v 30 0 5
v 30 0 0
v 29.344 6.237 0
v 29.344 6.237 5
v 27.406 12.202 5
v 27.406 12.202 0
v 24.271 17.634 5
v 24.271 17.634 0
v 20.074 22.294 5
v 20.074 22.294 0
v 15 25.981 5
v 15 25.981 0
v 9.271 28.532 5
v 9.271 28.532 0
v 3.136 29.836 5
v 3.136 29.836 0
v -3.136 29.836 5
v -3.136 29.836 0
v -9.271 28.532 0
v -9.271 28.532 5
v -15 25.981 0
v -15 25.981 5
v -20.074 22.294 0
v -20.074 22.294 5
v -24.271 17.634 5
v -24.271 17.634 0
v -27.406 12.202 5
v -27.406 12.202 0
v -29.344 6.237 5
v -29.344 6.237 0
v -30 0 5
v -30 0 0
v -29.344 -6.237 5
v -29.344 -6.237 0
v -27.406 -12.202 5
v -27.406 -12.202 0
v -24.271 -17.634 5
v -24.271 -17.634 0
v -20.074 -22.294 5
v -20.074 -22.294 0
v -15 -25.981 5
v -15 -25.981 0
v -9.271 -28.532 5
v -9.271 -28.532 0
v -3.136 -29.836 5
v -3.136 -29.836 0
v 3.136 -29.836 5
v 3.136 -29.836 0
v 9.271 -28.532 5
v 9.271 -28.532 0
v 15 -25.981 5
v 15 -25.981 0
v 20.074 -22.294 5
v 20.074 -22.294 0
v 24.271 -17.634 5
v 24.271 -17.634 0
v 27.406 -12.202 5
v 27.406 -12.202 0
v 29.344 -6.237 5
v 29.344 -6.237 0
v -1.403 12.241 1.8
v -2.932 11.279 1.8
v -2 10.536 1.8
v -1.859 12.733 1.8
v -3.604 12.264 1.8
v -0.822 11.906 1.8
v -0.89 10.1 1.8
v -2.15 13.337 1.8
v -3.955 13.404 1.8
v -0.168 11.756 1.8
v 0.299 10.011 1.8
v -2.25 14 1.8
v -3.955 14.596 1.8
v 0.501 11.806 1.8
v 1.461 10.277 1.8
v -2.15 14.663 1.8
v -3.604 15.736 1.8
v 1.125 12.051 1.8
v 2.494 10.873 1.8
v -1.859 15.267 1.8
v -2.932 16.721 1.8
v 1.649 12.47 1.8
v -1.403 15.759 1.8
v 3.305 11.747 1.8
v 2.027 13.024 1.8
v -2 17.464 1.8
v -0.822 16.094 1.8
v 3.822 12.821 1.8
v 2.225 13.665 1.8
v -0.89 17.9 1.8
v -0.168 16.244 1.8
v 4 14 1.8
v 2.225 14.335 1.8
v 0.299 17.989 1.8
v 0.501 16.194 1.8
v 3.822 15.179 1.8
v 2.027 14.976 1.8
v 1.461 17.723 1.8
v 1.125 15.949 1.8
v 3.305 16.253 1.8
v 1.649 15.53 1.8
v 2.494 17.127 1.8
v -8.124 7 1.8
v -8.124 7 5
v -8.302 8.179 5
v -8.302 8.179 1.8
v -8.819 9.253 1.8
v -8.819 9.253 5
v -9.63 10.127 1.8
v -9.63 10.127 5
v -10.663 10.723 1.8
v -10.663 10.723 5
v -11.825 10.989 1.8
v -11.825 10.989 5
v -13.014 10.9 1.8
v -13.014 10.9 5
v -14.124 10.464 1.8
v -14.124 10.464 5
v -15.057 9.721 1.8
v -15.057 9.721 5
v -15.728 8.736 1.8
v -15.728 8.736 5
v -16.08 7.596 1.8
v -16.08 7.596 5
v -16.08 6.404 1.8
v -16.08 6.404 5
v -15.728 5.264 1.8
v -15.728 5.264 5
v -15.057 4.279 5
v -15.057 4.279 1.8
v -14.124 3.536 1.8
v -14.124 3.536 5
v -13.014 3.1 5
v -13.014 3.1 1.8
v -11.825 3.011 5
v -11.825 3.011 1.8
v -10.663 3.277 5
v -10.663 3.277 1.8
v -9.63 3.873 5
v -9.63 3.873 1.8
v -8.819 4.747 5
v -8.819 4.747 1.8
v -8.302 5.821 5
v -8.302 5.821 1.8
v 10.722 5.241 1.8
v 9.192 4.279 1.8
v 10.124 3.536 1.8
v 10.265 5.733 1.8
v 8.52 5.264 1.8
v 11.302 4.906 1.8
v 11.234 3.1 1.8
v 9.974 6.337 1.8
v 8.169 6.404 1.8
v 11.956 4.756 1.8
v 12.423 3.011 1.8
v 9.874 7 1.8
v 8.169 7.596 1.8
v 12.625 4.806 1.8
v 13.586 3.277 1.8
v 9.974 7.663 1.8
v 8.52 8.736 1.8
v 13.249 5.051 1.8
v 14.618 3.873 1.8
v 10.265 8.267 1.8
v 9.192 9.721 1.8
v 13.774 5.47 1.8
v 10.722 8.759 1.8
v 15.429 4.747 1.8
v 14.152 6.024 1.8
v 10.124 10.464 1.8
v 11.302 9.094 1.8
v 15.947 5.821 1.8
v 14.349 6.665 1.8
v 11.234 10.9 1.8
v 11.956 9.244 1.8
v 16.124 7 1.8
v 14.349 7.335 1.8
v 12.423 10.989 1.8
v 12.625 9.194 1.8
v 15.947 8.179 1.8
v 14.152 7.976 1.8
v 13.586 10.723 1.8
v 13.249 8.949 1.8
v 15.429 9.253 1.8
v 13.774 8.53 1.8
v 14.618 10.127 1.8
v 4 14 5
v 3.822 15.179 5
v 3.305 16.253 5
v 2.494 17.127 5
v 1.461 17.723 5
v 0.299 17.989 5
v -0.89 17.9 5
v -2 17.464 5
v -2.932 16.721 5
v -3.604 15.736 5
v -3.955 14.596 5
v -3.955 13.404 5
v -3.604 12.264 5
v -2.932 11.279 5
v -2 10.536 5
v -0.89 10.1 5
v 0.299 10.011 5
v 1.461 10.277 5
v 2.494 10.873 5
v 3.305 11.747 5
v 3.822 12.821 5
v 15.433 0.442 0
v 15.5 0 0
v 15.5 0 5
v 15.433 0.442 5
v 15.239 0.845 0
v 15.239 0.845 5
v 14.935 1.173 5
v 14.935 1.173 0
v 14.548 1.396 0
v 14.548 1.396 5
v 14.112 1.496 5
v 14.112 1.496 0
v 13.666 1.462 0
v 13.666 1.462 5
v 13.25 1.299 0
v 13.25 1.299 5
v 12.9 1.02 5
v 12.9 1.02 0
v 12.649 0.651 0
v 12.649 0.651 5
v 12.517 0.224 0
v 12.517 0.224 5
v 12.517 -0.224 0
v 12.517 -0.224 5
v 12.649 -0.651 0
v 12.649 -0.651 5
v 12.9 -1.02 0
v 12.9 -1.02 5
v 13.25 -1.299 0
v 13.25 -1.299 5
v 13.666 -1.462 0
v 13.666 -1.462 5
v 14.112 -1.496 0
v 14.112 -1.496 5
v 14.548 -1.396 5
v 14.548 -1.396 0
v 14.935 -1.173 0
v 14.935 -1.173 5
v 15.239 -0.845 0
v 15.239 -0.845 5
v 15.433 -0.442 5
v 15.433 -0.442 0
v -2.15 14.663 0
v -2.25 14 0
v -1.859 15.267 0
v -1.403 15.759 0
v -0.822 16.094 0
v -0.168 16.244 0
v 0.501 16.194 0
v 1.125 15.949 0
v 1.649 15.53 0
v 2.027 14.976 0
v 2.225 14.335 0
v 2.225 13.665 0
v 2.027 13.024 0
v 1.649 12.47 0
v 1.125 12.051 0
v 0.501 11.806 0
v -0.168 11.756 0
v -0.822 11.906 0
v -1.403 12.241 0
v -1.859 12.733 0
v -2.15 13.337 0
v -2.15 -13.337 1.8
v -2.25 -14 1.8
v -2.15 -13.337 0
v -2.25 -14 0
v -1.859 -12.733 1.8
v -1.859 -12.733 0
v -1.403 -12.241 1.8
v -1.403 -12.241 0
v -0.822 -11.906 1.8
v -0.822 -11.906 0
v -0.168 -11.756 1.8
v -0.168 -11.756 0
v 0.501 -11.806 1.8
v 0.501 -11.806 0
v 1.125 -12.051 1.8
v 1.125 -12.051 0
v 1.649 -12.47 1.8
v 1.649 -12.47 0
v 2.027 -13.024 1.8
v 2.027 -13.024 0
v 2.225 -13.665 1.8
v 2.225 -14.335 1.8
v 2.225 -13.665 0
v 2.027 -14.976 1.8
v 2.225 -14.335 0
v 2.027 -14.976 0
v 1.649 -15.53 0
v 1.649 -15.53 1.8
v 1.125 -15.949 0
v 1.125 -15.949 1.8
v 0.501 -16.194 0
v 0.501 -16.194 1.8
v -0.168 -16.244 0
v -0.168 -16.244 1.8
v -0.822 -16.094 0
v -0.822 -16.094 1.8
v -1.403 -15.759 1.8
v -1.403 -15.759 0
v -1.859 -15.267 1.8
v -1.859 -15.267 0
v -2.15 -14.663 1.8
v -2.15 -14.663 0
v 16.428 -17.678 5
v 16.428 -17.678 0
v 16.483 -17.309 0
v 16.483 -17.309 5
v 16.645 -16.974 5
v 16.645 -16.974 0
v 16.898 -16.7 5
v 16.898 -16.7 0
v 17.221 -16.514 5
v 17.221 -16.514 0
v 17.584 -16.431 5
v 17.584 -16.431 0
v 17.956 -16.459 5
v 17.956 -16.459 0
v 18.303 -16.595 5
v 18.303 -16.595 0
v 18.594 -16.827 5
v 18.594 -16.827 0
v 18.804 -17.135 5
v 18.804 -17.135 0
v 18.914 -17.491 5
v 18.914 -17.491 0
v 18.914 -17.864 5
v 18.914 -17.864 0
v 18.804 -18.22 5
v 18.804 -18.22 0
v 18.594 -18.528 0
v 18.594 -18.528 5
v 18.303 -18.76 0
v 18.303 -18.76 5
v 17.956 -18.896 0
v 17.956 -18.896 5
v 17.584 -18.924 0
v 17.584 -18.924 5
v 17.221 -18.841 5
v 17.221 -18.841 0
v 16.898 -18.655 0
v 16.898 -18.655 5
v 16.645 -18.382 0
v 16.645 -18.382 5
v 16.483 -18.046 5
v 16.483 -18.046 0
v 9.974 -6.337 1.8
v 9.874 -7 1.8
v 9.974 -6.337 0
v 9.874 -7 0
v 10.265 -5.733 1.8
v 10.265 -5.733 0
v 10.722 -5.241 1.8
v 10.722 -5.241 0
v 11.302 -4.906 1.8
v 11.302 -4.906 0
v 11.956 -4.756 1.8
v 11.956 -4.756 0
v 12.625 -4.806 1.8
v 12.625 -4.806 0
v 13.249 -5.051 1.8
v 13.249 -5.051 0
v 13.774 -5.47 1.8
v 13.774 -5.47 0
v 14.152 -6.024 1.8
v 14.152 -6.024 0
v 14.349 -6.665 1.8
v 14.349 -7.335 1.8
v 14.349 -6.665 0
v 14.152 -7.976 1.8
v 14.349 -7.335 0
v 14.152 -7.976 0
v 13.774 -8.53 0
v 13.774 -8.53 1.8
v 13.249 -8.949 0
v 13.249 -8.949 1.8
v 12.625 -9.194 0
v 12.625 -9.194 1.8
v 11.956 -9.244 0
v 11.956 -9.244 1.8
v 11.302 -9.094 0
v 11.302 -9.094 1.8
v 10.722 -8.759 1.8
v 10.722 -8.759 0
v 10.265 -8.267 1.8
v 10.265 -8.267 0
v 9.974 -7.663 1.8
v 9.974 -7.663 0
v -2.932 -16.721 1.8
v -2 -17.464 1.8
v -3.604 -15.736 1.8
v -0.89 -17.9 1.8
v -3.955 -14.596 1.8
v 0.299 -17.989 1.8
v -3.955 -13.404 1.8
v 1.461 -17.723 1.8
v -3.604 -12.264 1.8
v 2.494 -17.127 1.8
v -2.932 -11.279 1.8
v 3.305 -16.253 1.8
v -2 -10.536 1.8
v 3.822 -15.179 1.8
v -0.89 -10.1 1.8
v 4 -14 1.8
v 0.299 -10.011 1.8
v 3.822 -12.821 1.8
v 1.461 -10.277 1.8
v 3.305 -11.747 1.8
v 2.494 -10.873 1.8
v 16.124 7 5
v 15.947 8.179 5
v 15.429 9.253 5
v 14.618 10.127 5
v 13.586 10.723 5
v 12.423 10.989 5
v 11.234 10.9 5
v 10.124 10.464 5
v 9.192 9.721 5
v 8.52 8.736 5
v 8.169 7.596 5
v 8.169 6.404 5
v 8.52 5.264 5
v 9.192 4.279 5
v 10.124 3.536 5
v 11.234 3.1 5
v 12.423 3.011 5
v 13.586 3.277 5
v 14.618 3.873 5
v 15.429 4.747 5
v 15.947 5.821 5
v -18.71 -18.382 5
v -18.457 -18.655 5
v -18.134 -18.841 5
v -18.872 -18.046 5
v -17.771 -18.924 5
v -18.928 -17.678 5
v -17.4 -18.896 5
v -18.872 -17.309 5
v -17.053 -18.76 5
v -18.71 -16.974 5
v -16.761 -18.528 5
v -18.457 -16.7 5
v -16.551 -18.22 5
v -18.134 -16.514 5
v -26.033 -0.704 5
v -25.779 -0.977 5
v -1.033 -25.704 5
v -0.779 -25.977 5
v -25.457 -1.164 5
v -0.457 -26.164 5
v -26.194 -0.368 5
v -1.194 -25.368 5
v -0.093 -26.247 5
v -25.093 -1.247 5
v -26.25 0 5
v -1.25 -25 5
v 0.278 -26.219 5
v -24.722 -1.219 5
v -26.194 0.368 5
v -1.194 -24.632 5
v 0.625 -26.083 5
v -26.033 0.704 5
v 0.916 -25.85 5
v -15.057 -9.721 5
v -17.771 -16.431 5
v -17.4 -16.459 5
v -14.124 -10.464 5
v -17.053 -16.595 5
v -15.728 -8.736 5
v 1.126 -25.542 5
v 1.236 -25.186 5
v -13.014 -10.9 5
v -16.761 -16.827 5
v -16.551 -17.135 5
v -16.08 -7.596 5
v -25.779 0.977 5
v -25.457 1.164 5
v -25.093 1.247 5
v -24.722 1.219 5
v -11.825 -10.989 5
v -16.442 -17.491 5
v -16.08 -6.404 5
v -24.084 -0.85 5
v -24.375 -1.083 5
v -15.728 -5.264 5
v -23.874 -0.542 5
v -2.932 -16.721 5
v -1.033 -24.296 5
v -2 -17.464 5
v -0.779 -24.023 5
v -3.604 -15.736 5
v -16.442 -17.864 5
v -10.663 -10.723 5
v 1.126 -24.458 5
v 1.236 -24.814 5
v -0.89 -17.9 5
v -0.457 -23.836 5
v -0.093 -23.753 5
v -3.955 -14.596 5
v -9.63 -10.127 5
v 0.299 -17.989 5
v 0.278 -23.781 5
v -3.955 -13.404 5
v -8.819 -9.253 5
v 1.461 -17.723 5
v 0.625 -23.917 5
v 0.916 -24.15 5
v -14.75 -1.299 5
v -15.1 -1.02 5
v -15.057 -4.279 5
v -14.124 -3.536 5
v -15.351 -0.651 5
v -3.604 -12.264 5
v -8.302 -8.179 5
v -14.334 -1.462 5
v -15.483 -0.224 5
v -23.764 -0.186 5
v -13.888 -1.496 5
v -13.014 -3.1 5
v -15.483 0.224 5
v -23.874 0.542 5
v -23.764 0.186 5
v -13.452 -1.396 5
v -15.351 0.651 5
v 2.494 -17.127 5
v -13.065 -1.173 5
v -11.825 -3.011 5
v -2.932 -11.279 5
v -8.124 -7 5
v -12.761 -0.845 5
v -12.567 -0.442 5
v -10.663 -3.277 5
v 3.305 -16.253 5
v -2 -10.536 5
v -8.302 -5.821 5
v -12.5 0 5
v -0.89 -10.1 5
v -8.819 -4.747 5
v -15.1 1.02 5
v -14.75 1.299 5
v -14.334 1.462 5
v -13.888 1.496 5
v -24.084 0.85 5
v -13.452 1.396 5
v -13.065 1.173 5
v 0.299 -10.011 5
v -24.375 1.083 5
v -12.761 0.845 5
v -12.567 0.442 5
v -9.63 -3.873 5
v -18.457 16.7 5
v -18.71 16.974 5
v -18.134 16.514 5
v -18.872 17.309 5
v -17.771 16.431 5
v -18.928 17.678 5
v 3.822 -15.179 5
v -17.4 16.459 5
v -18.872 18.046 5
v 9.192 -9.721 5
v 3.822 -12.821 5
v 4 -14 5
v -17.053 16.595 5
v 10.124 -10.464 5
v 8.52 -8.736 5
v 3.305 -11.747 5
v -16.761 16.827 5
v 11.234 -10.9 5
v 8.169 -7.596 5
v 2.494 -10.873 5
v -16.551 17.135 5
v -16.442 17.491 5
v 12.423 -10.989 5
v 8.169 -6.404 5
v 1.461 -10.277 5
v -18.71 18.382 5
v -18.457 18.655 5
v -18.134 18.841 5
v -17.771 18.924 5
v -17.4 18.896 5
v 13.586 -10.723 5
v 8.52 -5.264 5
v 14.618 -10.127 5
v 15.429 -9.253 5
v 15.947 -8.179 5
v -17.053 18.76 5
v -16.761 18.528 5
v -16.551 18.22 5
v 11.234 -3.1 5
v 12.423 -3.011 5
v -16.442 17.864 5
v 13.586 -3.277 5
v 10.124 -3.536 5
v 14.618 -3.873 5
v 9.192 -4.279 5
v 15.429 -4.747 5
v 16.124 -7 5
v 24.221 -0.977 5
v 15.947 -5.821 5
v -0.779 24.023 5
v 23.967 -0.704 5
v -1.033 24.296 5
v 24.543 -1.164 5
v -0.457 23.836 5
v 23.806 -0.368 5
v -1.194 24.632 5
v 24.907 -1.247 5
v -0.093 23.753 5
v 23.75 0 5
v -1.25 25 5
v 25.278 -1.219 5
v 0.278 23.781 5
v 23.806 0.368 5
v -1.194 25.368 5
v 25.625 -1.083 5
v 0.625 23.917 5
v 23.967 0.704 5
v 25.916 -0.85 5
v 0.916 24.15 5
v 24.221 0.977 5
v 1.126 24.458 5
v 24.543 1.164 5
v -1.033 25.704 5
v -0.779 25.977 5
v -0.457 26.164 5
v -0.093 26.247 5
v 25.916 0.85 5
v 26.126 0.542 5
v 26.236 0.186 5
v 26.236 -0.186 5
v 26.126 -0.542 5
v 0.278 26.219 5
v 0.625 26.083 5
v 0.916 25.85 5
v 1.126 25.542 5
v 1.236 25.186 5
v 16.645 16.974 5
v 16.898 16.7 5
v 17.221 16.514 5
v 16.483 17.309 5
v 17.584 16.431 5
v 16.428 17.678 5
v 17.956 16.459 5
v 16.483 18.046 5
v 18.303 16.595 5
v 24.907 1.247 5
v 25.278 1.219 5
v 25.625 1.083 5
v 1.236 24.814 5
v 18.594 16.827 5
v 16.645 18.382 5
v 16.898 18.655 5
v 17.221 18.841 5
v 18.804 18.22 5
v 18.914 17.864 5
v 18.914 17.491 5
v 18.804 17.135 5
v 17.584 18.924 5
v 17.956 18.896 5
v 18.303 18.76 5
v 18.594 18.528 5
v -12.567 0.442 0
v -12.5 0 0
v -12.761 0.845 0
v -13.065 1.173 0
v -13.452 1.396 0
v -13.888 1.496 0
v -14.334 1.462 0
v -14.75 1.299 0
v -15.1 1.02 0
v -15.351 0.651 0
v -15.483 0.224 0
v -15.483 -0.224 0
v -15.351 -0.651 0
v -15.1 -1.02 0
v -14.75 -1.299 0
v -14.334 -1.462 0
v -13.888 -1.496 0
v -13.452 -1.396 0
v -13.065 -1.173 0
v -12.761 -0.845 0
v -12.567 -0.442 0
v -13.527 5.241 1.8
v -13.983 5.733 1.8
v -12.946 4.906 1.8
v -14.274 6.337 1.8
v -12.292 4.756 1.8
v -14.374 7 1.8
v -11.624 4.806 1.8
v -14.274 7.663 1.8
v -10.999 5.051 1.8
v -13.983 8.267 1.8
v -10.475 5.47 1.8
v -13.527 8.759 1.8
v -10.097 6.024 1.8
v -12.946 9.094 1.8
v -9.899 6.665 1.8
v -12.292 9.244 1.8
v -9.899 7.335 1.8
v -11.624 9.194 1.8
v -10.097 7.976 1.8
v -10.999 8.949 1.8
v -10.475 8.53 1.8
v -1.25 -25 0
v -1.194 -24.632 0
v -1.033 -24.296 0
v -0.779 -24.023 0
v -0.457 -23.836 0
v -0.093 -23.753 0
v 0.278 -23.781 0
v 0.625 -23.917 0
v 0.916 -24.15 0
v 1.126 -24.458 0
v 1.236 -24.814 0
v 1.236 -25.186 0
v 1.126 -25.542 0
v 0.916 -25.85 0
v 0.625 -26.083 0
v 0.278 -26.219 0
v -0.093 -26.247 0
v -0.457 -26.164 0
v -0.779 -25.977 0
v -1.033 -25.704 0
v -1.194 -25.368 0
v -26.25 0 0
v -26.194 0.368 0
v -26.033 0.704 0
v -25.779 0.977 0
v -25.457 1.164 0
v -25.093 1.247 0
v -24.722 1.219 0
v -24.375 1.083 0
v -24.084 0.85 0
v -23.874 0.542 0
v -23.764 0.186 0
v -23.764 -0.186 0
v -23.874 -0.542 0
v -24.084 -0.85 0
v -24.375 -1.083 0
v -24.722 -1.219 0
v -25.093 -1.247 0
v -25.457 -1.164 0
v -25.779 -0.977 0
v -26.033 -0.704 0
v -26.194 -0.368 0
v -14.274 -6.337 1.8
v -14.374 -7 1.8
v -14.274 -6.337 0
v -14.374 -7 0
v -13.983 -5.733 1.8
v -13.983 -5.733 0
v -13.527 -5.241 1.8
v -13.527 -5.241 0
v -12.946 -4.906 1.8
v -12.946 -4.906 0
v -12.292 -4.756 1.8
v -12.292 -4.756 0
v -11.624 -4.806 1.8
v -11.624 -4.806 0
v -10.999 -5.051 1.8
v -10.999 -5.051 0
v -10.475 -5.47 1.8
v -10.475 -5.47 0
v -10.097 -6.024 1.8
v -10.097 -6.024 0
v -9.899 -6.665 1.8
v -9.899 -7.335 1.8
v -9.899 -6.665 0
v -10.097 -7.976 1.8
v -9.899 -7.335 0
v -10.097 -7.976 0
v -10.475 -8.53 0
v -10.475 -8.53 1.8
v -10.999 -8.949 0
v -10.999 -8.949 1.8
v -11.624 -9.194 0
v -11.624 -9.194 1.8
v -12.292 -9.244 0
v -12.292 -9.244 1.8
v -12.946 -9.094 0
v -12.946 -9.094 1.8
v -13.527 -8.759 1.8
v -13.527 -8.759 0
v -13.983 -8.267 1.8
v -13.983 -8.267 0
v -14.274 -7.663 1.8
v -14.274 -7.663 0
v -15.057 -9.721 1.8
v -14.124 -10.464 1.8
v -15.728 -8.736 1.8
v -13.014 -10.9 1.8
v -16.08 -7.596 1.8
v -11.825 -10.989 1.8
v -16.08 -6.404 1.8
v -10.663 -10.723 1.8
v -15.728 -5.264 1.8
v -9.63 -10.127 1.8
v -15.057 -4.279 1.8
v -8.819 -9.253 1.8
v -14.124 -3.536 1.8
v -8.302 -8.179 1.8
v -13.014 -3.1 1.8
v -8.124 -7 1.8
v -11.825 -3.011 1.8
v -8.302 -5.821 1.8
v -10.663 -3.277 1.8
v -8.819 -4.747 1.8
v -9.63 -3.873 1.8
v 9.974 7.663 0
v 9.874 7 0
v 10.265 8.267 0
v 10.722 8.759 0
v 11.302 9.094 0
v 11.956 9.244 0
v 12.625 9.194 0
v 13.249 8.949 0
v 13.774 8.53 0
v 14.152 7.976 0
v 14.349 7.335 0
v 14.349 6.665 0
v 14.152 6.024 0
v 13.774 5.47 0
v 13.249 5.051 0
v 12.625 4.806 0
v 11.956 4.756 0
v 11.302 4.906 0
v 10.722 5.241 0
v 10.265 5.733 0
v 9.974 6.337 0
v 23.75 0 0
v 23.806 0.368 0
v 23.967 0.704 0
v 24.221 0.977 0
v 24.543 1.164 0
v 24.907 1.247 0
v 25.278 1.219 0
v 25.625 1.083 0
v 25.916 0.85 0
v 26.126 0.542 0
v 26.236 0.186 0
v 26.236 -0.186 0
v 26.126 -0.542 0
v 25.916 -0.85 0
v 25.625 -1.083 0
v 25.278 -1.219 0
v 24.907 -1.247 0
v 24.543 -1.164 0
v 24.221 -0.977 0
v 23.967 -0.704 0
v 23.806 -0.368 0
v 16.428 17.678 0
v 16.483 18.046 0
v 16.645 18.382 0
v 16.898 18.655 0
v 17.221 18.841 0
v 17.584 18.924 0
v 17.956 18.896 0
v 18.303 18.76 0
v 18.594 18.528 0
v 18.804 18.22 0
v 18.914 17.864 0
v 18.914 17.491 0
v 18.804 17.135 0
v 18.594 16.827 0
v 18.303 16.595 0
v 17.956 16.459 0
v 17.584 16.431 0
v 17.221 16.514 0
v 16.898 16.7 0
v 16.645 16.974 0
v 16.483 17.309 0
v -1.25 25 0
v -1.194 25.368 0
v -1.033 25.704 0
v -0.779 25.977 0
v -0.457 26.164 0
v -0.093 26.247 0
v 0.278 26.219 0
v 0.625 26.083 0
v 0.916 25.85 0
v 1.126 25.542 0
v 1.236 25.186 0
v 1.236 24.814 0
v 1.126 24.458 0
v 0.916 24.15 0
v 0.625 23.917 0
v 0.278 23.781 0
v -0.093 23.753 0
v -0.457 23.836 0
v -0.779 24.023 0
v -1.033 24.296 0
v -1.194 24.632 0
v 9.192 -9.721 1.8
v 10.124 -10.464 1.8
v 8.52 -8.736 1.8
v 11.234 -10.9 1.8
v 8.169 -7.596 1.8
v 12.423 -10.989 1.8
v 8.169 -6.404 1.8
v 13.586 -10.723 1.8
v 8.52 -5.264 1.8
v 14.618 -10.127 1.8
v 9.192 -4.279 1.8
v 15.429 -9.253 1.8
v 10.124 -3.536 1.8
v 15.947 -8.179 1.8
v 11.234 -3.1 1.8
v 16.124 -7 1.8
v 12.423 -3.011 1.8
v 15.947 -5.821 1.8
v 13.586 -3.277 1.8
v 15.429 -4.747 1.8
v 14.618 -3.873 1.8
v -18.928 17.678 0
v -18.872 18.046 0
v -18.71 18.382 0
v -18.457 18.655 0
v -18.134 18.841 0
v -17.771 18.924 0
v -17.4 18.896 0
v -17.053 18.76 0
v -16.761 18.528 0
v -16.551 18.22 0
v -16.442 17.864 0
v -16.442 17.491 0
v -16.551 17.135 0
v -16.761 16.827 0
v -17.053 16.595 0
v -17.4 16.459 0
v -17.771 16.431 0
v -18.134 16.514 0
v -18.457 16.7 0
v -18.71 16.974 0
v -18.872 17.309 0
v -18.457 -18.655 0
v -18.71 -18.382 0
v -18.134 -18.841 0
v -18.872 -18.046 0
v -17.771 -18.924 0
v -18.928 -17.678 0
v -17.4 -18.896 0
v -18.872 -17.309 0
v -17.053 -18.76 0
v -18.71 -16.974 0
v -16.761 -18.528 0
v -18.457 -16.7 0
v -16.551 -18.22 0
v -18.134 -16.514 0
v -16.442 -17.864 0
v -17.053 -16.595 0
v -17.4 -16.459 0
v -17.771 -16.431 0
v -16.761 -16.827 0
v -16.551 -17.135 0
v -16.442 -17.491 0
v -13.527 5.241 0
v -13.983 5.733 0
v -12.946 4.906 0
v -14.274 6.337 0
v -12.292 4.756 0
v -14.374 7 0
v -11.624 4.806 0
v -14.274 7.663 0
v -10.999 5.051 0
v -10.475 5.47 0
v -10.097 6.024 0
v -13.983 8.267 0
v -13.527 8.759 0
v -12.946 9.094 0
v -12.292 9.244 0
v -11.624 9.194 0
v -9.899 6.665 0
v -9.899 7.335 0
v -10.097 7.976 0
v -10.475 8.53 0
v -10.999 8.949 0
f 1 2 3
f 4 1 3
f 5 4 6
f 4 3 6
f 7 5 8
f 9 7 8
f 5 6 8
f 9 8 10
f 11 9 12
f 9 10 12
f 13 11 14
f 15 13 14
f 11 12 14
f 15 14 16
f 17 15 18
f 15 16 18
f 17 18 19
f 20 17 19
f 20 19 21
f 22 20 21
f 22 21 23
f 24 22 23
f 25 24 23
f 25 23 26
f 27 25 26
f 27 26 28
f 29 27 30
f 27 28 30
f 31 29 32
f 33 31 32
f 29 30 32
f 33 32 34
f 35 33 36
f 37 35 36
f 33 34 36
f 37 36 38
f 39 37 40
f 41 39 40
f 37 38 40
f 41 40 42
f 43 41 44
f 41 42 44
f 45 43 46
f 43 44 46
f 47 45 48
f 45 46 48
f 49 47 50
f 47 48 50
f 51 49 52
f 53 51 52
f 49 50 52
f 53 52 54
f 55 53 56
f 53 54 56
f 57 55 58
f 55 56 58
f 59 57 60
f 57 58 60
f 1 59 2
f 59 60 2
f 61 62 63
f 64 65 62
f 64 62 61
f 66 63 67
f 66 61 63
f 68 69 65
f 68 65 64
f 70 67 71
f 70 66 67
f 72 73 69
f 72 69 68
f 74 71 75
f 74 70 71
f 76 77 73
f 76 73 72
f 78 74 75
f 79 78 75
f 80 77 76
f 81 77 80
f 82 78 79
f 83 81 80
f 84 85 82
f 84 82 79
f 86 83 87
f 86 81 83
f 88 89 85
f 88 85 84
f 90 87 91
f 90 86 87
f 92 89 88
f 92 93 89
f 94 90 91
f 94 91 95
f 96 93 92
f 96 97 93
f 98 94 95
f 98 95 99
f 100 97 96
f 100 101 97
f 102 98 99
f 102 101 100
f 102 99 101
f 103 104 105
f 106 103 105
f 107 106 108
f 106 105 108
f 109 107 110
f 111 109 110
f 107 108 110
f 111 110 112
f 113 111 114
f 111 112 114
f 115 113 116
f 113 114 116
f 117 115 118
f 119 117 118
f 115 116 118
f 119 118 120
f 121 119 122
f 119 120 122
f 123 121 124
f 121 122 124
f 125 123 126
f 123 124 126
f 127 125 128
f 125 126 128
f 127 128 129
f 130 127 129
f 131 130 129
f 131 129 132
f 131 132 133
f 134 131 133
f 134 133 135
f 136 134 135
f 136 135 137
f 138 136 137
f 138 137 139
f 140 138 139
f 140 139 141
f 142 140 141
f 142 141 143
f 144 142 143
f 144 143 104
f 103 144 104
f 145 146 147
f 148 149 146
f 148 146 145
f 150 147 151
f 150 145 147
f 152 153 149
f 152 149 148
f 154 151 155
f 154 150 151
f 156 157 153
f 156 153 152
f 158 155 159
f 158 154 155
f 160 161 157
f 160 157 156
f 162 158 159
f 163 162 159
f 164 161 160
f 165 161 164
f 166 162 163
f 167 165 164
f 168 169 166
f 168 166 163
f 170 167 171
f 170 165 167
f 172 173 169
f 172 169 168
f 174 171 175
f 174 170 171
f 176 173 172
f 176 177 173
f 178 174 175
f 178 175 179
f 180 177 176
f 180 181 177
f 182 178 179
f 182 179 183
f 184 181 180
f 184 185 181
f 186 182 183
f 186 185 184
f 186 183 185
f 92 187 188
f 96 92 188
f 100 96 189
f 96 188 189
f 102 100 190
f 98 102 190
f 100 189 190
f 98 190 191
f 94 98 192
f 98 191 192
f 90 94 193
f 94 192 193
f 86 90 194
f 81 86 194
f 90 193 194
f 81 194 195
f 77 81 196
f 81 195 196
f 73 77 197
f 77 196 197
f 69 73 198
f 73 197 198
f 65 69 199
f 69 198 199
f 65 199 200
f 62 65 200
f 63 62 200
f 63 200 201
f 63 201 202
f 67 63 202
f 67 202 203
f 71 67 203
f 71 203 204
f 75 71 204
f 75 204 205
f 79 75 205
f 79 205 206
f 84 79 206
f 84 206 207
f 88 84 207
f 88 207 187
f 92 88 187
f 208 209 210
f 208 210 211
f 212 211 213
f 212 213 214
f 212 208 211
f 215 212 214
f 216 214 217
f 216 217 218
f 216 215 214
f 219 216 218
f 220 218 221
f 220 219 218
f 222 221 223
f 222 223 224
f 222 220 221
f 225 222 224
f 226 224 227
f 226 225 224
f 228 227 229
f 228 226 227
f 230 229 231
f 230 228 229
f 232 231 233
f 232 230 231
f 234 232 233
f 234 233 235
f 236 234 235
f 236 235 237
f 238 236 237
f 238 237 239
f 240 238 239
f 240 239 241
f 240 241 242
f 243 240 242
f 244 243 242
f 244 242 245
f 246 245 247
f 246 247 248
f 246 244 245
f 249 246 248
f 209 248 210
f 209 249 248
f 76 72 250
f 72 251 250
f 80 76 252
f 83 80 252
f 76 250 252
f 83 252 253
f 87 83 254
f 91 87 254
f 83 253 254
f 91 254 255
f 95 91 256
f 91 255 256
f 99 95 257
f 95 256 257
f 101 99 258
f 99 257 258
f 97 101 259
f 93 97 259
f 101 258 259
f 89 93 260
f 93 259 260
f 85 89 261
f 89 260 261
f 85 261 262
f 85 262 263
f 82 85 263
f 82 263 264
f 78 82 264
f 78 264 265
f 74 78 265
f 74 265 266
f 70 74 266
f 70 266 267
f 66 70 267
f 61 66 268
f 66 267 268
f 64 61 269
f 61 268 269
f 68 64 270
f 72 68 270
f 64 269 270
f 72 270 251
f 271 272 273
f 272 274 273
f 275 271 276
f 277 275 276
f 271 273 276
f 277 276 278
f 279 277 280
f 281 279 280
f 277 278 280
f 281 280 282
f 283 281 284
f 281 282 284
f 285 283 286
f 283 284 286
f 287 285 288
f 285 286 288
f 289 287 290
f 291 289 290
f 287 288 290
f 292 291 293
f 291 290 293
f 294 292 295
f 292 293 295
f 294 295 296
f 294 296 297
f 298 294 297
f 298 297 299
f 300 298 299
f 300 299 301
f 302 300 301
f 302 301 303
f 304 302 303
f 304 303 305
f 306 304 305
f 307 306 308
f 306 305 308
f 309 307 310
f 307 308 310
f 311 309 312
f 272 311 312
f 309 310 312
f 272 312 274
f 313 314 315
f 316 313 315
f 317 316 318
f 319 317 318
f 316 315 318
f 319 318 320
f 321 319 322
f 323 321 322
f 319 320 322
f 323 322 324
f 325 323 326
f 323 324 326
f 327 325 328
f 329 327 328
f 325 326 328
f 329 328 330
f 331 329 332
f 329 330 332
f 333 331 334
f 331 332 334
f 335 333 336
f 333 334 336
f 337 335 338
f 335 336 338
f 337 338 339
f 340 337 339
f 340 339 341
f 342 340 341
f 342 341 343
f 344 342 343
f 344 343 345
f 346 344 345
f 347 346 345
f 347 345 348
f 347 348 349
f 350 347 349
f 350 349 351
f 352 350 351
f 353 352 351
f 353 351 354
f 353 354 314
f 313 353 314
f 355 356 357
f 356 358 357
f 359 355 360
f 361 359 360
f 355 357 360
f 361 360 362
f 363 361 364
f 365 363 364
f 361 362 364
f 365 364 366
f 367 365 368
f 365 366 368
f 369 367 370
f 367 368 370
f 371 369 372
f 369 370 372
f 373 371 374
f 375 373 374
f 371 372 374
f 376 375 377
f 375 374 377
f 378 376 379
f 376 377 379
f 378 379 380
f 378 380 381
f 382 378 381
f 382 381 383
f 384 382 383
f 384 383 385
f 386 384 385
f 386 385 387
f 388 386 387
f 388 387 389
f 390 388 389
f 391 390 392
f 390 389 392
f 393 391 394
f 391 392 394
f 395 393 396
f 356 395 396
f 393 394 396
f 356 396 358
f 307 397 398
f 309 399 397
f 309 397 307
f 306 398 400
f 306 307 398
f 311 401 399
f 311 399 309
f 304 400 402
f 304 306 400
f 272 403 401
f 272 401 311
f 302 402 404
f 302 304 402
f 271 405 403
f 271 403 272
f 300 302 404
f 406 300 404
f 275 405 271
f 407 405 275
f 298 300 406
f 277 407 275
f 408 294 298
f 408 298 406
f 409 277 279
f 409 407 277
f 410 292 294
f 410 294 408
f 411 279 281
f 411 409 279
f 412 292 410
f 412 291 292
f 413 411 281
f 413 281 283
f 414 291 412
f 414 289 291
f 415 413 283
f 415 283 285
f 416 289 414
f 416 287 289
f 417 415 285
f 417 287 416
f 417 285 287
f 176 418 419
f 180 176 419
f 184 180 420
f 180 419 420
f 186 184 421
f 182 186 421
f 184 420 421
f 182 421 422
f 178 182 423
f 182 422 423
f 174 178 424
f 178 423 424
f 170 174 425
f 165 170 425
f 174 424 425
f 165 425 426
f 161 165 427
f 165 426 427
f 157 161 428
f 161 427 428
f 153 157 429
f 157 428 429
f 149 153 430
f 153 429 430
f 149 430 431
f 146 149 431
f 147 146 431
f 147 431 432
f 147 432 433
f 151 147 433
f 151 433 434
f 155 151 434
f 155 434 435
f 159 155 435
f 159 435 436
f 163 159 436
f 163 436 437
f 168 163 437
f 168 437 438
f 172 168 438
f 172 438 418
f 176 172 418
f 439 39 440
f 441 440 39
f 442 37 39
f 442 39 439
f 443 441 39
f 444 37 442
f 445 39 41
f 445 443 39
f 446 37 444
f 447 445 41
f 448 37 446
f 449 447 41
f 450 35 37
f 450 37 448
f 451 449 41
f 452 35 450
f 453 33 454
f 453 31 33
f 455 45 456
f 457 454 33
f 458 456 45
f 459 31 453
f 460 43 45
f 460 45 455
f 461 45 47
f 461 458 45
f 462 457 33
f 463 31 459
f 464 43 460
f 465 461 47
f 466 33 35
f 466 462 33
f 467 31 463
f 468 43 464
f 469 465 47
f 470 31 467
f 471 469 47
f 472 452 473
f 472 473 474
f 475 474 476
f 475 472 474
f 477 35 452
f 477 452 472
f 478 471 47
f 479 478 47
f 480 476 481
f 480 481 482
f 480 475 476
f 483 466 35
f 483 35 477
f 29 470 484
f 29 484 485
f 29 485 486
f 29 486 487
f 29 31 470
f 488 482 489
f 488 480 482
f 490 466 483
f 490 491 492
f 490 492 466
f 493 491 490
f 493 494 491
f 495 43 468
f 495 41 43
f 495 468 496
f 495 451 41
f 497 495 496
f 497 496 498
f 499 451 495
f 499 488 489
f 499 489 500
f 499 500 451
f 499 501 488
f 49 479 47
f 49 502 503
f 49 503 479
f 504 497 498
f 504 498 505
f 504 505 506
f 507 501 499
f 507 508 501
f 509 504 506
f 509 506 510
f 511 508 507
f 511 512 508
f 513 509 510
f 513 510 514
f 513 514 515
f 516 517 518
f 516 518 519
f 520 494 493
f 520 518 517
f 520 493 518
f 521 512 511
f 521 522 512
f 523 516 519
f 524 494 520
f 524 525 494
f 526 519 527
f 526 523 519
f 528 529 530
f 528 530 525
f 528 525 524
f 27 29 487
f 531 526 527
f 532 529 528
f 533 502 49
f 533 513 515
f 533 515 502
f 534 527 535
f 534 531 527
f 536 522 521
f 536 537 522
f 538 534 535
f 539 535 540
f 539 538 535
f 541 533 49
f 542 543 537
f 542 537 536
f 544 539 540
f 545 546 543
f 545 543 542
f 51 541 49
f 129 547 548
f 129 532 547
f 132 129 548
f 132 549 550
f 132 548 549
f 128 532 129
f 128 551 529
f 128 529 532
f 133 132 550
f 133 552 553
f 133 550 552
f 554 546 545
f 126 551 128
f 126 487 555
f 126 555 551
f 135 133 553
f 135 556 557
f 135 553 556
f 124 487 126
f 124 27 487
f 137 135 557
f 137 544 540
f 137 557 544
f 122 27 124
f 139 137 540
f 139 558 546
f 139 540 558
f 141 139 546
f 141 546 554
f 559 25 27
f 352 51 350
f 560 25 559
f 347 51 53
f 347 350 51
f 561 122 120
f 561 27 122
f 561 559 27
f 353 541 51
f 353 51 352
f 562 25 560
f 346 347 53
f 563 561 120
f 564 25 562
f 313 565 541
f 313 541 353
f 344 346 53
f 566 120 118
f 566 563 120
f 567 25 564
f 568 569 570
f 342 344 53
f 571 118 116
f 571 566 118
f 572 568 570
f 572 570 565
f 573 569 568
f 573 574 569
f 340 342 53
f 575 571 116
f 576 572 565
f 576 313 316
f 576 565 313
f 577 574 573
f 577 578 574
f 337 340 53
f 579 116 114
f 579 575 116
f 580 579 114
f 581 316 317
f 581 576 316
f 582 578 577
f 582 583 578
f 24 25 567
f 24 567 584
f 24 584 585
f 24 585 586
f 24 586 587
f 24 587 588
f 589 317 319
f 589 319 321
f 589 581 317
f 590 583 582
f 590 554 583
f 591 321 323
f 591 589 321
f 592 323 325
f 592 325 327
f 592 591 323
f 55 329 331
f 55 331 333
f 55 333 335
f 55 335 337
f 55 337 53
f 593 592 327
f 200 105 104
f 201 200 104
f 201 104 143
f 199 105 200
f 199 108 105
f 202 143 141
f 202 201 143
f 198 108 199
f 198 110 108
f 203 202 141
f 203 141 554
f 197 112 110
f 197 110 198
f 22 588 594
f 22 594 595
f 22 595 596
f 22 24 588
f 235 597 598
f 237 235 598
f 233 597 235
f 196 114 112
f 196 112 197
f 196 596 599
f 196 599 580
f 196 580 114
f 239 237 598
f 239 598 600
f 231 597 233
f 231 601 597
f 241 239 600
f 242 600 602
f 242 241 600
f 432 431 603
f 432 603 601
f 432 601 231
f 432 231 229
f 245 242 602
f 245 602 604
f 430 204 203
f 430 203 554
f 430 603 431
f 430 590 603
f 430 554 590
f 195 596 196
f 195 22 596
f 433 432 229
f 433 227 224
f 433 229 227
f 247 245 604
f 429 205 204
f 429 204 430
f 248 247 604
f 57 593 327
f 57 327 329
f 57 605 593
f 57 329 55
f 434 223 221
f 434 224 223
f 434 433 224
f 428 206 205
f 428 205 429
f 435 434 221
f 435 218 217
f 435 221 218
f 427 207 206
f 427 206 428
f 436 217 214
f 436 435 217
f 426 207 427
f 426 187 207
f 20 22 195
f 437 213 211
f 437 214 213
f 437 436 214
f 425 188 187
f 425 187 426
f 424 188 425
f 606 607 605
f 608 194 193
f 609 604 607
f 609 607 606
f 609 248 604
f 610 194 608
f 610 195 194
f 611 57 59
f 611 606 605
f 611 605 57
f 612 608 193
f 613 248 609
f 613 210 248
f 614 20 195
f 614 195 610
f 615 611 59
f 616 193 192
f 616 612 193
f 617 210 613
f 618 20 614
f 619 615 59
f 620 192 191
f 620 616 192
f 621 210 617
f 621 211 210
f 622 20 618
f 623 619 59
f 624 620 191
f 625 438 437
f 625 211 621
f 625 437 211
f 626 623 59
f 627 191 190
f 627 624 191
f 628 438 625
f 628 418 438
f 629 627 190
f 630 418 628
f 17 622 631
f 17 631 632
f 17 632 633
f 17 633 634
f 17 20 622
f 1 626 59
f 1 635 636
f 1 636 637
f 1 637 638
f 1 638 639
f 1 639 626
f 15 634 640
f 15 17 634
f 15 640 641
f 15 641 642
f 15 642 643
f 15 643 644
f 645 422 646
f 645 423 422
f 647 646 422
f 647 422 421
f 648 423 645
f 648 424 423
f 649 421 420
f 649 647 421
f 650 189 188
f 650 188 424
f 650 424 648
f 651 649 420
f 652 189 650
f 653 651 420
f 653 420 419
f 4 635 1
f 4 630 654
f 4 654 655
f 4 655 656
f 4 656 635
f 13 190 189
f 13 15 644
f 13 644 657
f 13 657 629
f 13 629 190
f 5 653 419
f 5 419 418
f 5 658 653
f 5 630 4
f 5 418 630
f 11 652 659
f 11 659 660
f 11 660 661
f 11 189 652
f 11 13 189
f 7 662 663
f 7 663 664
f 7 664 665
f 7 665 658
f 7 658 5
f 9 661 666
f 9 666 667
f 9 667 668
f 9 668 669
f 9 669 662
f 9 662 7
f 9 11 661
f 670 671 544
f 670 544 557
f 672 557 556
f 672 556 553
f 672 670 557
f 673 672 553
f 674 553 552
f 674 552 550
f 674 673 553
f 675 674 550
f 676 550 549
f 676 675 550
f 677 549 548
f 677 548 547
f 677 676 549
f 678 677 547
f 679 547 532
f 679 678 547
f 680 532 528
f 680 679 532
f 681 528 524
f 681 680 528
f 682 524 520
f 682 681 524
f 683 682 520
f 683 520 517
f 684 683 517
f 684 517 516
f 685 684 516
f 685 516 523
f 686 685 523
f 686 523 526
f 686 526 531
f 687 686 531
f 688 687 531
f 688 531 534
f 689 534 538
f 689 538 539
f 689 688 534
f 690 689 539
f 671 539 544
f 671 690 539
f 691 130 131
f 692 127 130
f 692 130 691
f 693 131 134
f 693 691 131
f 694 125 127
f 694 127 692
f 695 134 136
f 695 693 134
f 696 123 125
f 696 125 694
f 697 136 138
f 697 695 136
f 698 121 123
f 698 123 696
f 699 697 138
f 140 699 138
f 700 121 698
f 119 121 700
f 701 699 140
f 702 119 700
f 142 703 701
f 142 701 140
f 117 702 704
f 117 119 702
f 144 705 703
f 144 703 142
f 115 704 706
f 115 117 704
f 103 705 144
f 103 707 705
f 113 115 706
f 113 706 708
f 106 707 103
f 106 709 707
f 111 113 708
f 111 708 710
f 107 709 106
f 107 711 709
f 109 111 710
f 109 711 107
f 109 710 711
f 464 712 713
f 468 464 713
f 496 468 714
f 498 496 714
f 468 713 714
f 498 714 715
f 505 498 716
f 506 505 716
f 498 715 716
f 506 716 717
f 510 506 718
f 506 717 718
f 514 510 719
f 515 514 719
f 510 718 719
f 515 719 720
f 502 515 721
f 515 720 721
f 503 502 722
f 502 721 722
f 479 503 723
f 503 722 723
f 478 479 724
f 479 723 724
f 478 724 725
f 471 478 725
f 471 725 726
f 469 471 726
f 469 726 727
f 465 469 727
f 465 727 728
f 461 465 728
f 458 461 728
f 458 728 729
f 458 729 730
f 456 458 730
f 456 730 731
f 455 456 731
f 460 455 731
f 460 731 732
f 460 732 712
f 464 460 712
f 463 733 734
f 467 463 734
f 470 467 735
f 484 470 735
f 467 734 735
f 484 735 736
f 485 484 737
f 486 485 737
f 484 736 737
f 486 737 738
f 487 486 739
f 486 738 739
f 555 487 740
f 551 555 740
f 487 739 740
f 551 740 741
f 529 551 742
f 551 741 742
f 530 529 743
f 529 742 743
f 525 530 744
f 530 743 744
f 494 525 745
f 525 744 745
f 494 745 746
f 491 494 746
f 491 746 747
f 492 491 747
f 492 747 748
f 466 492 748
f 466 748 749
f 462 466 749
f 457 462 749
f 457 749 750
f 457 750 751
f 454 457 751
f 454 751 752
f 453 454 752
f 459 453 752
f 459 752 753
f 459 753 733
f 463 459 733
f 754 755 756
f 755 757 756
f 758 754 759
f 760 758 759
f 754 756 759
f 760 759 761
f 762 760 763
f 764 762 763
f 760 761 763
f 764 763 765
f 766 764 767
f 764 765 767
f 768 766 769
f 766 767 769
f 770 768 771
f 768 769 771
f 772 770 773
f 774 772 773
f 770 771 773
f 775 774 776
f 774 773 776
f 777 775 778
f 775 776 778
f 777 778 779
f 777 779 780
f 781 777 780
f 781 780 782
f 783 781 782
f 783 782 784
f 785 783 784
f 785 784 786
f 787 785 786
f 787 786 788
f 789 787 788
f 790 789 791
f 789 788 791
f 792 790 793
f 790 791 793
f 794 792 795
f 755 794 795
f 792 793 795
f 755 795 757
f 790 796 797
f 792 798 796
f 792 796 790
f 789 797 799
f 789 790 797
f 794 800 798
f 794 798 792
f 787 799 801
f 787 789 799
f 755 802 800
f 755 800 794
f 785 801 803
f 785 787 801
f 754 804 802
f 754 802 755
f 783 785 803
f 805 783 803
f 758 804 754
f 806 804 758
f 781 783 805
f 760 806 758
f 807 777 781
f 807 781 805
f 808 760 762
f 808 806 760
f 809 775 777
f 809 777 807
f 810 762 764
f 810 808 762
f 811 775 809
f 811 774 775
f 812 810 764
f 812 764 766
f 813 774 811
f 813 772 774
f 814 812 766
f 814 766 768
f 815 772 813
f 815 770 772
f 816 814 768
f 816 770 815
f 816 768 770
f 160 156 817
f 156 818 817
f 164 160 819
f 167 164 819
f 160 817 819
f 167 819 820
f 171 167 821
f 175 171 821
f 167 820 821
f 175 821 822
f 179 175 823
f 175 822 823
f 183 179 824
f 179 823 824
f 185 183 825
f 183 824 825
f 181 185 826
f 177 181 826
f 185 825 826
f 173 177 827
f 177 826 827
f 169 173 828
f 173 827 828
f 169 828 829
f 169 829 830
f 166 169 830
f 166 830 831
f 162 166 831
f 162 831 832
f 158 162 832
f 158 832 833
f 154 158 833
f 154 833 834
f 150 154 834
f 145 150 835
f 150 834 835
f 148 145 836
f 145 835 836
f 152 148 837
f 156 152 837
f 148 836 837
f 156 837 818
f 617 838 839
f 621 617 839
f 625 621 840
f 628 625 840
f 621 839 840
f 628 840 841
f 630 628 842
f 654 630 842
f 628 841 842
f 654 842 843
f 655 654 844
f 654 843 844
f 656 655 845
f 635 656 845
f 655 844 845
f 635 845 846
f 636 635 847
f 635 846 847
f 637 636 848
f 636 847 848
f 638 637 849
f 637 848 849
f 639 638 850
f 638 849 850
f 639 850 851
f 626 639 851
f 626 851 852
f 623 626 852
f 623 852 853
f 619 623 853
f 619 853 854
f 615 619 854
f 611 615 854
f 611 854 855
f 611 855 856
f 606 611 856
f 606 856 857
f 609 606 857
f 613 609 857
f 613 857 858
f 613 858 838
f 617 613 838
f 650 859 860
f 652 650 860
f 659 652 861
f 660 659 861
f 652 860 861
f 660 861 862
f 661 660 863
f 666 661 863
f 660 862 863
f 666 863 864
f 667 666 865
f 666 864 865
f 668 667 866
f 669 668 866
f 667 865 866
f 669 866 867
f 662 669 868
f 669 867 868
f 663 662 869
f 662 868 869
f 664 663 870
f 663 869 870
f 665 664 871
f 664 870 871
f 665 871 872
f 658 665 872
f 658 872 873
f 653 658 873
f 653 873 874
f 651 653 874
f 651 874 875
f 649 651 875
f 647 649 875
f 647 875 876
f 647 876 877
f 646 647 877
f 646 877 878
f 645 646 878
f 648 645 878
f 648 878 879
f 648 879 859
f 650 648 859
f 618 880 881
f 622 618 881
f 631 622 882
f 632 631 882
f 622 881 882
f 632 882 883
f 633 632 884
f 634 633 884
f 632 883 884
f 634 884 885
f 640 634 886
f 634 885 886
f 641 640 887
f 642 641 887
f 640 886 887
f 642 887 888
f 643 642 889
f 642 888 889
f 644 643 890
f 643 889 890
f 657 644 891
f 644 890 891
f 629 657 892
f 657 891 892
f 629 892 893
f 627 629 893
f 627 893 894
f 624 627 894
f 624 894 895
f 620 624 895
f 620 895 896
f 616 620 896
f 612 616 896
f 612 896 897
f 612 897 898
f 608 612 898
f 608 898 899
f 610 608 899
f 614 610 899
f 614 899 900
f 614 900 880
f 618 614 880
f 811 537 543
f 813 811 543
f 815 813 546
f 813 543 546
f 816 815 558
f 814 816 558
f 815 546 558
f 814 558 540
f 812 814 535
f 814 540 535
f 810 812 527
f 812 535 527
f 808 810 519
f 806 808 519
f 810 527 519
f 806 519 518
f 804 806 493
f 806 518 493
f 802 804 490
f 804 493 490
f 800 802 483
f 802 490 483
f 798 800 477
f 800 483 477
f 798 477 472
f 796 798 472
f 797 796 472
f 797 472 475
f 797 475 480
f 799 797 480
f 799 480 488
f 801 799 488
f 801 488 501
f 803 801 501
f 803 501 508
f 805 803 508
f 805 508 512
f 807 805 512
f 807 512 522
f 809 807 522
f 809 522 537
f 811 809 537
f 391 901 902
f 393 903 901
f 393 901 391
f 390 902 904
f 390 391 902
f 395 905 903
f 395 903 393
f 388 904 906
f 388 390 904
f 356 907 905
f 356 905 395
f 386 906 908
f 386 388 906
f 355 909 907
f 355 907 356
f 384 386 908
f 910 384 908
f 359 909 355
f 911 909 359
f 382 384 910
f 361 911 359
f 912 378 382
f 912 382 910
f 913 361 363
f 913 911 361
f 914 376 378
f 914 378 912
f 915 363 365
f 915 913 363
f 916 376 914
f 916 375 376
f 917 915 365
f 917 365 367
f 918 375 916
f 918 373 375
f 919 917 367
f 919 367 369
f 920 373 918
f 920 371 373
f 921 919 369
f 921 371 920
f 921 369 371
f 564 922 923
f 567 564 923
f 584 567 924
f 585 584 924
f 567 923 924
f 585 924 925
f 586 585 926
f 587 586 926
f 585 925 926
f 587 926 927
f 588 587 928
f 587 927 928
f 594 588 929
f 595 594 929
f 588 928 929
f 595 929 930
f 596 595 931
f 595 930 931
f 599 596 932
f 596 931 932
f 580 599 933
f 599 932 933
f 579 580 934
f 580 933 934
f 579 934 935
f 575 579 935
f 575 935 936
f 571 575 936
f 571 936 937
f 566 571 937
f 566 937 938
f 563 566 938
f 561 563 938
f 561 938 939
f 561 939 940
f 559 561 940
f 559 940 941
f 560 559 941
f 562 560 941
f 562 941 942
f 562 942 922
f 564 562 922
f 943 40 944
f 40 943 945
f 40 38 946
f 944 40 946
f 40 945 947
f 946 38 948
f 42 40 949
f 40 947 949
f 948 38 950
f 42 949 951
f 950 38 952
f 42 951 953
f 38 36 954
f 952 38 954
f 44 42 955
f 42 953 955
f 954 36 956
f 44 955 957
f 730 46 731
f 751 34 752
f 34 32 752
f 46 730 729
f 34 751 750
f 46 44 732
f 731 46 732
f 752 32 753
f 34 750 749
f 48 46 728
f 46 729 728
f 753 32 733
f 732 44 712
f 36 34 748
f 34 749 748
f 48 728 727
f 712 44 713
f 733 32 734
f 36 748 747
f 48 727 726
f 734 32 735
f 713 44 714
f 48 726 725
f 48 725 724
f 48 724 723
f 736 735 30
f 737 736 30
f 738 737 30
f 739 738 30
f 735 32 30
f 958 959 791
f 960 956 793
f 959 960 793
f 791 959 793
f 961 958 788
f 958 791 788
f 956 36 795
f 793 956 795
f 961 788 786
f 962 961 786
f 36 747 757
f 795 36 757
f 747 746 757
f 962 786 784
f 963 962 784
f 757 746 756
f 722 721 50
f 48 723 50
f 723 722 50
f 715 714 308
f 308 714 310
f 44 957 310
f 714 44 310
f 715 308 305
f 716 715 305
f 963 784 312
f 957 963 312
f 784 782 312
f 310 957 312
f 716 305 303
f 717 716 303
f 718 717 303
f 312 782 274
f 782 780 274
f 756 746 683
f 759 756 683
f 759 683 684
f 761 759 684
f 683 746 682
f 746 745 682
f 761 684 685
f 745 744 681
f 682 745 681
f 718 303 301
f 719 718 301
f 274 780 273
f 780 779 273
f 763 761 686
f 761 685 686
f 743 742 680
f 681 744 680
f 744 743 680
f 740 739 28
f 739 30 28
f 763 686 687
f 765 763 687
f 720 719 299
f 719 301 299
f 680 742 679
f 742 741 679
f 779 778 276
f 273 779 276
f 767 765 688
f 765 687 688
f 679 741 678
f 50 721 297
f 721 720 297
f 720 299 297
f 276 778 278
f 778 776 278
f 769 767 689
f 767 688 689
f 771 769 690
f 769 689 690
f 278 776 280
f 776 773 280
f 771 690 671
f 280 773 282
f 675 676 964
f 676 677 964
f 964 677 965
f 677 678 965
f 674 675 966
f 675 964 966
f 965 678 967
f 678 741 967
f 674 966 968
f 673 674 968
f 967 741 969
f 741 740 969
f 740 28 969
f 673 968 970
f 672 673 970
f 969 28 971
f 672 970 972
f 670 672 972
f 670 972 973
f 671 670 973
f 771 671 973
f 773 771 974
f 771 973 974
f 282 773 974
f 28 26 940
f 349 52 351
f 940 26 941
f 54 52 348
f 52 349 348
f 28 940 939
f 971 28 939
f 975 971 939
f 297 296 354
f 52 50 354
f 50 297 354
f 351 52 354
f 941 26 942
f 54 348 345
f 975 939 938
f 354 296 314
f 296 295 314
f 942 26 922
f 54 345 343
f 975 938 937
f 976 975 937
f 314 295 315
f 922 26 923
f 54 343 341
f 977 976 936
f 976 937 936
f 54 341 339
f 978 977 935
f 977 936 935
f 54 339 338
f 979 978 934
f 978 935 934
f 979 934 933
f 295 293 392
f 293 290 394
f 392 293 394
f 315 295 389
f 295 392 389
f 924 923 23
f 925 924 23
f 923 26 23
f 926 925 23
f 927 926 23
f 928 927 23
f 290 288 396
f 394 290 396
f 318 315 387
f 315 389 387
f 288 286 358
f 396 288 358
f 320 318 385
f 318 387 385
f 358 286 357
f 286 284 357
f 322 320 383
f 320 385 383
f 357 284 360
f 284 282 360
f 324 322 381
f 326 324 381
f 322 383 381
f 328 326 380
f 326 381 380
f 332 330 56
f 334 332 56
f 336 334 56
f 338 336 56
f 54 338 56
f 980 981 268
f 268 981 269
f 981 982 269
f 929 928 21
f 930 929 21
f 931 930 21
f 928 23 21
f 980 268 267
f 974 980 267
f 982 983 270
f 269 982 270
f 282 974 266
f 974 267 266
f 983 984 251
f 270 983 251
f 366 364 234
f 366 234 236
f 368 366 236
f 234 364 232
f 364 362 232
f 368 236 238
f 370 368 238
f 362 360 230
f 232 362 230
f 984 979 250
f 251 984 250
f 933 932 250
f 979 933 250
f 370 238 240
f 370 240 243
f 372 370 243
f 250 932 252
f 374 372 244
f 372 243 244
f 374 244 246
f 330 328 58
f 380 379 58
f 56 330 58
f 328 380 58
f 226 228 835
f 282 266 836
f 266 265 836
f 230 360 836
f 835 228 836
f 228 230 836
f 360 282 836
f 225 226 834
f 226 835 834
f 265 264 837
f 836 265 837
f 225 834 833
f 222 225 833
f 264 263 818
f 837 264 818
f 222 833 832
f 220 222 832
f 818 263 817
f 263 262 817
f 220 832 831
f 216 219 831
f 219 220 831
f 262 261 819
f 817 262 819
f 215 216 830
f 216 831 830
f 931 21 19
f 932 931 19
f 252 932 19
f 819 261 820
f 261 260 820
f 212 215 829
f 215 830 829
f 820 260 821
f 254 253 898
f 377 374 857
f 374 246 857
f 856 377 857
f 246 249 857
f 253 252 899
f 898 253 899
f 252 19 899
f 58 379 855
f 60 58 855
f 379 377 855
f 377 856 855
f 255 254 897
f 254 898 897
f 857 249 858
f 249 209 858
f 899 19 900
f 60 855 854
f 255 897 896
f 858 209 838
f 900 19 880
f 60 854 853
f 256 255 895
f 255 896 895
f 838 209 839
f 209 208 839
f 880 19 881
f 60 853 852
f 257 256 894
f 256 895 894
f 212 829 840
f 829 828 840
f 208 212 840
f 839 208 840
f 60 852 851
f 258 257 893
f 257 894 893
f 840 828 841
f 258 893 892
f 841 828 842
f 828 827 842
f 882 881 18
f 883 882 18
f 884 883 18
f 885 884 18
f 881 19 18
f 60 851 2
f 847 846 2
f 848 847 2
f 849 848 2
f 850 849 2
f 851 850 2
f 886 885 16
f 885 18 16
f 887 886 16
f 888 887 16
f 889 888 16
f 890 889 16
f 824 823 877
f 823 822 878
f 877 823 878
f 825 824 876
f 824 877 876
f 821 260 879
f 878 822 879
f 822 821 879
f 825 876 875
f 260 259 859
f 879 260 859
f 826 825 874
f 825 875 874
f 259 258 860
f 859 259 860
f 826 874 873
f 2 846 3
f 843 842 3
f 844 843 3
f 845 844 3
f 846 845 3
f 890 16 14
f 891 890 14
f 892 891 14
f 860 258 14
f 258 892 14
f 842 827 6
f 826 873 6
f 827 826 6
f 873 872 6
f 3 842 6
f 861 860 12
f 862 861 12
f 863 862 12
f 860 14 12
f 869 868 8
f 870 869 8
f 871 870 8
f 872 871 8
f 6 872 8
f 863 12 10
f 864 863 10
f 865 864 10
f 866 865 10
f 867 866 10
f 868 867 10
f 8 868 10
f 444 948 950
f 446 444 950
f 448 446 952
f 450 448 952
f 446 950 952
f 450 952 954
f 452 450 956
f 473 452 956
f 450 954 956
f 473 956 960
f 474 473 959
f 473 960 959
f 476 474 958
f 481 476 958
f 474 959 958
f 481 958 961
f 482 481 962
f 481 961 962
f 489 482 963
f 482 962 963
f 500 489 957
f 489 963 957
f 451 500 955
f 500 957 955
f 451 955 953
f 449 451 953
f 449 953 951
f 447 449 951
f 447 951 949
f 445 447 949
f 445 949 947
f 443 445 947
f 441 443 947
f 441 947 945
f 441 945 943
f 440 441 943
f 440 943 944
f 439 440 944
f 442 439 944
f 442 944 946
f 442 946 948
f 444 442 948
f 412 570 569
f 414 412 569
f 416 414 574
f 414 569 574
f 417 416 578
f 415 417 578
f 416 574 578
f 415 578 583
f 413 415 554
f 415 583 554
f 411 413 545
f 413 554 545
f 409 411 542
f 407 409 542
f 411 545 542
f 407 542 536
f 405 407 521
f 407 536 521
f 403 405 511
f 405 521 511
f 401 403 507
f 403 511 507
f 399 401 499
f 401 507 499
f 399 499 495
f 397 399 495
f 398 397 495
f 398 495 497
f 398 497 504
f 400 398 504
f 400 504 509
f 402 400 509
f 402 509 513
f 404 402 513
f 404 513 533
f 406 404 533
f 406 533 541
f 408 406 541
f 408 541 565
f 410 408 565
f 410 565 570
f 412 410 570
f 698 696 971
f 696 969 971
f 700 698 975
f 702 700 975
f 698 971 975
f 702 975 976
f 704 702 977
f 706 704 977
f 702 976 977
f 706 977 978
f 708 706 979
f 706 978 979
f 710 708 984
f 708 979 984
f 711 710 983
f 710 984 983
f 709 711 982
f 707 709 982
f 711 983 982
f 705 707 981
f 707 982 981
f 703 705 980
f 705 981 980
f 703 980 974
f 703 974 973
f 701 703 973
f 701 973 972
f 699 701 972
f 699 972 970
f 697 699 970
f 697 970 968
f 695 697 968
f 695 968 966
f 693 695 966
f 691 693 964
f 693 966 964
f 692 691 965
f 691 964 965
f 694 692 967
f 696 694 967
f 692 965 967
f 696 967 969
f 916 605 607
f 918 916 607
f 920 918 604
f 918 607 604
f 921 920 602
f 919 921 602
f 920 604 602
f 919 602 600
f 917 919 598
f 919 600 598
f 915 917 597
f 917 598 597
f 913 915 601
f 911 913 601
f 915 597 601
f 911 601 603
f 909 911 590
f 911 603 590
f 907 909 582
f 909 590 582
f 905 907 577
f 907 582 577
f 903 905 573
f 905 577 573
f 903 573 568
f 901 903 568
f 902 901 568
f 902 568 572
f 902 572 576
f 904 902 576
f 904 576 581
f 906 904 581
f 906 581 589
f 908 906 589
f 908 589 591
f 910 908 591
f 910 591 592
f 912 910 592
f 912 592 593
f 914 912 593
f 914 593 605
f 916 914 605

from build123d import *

# Parameters (mm, degrees)
SKETCH1_R                                            = 30
BOSS_EXTRUDE1_DEPTH                                  = 5
CBORE_FOR_M4_HEX_SOCKET_THIN_HEAD_CAP_SC_D           = 4.5
CBORE_FOR_M4_HEX_SOCKET_THIN_HEAD_CAP_SC_CBORE_D     = 8
CBORE_FOR_M4_HEX_SOCKET_THIN_HEAD_CAP_SC_CBORE_DEPTH = 3.2
F_3_0MM_DOWEL_HOLE1_OUTLINE_R                        = 1.5
F_3_0MM_DOWEL_HOLE1_DEPTH                            = 5
TAP_DRILL_FOR_M3_TAP1_D                              = 2.5


# Read off the part's stored shape, not the designer's step: Ø3.0mm Dowel Hole1
with BuildPart() as part:
    # Sketch1 → Boss-Extrude1 (new body)
    with BuildSketch(Plane.XY):
        Circle(SKETCH1_R)
    extrude(amount=BOSS_EXTRUDE1_DEPTH)

    # CBORE for M4 Hex Socket Thin Head Cap Screw1 (through all)
    with Locations(Plane.XY.offset(5)):
        with Locations((-12.124355653, 7), (0, 14), (12.124355653, 7), (12.124355653, -7), (0, -14), (-12.124355653, -7)):
            CounterBoreHole(CBORE_FOR_M4_HEX_SOCKET_THIN_HEAD_CAP_SC_D / 2, CBORE_FOR_M4_HEX_SOCKET_THIN_HEAD_CAP_SC_CBORE_D / 2, CBORE_FOR_M4_HEX_SOCKET_THIN_HEAD_CAP_SC_CBORE_DEPTH)

    # Ø3.0mm Dowel Hole1 outline → Ø3.0mm Dowel Hole1 (cut)
    with BuildSketch(Plane.XY):
        with Locations((14, 0)):
            Circle(F_3_0MM_DOWEL_HOLE1_OUTLINE_R)
        with Locations((-14, 0)):
            Circle(F_3_0MM_DOWEL_HOLE1_OUTLINE_R)
    extrude(amount=F_3_0MM_DOWEL_HOLE1_DEPTH, mode=Mode.SUBTRACT)

    # Tap Drill for M3 Tap1 (through all)
    with Locations(Plane.XY.offset(5)):
        with Locations((-17.67766953, 17.67766953), (0, 25), (17.67766953, 17.67766953), (25, 0), (17.67766953, -17.67766953), (0, -25), (-17.67766953, -17.67766953), (-25, 0)):
            Hole(TAP_DRILL_FOR_M3_TAP1_D / 2)


solid = part.part
